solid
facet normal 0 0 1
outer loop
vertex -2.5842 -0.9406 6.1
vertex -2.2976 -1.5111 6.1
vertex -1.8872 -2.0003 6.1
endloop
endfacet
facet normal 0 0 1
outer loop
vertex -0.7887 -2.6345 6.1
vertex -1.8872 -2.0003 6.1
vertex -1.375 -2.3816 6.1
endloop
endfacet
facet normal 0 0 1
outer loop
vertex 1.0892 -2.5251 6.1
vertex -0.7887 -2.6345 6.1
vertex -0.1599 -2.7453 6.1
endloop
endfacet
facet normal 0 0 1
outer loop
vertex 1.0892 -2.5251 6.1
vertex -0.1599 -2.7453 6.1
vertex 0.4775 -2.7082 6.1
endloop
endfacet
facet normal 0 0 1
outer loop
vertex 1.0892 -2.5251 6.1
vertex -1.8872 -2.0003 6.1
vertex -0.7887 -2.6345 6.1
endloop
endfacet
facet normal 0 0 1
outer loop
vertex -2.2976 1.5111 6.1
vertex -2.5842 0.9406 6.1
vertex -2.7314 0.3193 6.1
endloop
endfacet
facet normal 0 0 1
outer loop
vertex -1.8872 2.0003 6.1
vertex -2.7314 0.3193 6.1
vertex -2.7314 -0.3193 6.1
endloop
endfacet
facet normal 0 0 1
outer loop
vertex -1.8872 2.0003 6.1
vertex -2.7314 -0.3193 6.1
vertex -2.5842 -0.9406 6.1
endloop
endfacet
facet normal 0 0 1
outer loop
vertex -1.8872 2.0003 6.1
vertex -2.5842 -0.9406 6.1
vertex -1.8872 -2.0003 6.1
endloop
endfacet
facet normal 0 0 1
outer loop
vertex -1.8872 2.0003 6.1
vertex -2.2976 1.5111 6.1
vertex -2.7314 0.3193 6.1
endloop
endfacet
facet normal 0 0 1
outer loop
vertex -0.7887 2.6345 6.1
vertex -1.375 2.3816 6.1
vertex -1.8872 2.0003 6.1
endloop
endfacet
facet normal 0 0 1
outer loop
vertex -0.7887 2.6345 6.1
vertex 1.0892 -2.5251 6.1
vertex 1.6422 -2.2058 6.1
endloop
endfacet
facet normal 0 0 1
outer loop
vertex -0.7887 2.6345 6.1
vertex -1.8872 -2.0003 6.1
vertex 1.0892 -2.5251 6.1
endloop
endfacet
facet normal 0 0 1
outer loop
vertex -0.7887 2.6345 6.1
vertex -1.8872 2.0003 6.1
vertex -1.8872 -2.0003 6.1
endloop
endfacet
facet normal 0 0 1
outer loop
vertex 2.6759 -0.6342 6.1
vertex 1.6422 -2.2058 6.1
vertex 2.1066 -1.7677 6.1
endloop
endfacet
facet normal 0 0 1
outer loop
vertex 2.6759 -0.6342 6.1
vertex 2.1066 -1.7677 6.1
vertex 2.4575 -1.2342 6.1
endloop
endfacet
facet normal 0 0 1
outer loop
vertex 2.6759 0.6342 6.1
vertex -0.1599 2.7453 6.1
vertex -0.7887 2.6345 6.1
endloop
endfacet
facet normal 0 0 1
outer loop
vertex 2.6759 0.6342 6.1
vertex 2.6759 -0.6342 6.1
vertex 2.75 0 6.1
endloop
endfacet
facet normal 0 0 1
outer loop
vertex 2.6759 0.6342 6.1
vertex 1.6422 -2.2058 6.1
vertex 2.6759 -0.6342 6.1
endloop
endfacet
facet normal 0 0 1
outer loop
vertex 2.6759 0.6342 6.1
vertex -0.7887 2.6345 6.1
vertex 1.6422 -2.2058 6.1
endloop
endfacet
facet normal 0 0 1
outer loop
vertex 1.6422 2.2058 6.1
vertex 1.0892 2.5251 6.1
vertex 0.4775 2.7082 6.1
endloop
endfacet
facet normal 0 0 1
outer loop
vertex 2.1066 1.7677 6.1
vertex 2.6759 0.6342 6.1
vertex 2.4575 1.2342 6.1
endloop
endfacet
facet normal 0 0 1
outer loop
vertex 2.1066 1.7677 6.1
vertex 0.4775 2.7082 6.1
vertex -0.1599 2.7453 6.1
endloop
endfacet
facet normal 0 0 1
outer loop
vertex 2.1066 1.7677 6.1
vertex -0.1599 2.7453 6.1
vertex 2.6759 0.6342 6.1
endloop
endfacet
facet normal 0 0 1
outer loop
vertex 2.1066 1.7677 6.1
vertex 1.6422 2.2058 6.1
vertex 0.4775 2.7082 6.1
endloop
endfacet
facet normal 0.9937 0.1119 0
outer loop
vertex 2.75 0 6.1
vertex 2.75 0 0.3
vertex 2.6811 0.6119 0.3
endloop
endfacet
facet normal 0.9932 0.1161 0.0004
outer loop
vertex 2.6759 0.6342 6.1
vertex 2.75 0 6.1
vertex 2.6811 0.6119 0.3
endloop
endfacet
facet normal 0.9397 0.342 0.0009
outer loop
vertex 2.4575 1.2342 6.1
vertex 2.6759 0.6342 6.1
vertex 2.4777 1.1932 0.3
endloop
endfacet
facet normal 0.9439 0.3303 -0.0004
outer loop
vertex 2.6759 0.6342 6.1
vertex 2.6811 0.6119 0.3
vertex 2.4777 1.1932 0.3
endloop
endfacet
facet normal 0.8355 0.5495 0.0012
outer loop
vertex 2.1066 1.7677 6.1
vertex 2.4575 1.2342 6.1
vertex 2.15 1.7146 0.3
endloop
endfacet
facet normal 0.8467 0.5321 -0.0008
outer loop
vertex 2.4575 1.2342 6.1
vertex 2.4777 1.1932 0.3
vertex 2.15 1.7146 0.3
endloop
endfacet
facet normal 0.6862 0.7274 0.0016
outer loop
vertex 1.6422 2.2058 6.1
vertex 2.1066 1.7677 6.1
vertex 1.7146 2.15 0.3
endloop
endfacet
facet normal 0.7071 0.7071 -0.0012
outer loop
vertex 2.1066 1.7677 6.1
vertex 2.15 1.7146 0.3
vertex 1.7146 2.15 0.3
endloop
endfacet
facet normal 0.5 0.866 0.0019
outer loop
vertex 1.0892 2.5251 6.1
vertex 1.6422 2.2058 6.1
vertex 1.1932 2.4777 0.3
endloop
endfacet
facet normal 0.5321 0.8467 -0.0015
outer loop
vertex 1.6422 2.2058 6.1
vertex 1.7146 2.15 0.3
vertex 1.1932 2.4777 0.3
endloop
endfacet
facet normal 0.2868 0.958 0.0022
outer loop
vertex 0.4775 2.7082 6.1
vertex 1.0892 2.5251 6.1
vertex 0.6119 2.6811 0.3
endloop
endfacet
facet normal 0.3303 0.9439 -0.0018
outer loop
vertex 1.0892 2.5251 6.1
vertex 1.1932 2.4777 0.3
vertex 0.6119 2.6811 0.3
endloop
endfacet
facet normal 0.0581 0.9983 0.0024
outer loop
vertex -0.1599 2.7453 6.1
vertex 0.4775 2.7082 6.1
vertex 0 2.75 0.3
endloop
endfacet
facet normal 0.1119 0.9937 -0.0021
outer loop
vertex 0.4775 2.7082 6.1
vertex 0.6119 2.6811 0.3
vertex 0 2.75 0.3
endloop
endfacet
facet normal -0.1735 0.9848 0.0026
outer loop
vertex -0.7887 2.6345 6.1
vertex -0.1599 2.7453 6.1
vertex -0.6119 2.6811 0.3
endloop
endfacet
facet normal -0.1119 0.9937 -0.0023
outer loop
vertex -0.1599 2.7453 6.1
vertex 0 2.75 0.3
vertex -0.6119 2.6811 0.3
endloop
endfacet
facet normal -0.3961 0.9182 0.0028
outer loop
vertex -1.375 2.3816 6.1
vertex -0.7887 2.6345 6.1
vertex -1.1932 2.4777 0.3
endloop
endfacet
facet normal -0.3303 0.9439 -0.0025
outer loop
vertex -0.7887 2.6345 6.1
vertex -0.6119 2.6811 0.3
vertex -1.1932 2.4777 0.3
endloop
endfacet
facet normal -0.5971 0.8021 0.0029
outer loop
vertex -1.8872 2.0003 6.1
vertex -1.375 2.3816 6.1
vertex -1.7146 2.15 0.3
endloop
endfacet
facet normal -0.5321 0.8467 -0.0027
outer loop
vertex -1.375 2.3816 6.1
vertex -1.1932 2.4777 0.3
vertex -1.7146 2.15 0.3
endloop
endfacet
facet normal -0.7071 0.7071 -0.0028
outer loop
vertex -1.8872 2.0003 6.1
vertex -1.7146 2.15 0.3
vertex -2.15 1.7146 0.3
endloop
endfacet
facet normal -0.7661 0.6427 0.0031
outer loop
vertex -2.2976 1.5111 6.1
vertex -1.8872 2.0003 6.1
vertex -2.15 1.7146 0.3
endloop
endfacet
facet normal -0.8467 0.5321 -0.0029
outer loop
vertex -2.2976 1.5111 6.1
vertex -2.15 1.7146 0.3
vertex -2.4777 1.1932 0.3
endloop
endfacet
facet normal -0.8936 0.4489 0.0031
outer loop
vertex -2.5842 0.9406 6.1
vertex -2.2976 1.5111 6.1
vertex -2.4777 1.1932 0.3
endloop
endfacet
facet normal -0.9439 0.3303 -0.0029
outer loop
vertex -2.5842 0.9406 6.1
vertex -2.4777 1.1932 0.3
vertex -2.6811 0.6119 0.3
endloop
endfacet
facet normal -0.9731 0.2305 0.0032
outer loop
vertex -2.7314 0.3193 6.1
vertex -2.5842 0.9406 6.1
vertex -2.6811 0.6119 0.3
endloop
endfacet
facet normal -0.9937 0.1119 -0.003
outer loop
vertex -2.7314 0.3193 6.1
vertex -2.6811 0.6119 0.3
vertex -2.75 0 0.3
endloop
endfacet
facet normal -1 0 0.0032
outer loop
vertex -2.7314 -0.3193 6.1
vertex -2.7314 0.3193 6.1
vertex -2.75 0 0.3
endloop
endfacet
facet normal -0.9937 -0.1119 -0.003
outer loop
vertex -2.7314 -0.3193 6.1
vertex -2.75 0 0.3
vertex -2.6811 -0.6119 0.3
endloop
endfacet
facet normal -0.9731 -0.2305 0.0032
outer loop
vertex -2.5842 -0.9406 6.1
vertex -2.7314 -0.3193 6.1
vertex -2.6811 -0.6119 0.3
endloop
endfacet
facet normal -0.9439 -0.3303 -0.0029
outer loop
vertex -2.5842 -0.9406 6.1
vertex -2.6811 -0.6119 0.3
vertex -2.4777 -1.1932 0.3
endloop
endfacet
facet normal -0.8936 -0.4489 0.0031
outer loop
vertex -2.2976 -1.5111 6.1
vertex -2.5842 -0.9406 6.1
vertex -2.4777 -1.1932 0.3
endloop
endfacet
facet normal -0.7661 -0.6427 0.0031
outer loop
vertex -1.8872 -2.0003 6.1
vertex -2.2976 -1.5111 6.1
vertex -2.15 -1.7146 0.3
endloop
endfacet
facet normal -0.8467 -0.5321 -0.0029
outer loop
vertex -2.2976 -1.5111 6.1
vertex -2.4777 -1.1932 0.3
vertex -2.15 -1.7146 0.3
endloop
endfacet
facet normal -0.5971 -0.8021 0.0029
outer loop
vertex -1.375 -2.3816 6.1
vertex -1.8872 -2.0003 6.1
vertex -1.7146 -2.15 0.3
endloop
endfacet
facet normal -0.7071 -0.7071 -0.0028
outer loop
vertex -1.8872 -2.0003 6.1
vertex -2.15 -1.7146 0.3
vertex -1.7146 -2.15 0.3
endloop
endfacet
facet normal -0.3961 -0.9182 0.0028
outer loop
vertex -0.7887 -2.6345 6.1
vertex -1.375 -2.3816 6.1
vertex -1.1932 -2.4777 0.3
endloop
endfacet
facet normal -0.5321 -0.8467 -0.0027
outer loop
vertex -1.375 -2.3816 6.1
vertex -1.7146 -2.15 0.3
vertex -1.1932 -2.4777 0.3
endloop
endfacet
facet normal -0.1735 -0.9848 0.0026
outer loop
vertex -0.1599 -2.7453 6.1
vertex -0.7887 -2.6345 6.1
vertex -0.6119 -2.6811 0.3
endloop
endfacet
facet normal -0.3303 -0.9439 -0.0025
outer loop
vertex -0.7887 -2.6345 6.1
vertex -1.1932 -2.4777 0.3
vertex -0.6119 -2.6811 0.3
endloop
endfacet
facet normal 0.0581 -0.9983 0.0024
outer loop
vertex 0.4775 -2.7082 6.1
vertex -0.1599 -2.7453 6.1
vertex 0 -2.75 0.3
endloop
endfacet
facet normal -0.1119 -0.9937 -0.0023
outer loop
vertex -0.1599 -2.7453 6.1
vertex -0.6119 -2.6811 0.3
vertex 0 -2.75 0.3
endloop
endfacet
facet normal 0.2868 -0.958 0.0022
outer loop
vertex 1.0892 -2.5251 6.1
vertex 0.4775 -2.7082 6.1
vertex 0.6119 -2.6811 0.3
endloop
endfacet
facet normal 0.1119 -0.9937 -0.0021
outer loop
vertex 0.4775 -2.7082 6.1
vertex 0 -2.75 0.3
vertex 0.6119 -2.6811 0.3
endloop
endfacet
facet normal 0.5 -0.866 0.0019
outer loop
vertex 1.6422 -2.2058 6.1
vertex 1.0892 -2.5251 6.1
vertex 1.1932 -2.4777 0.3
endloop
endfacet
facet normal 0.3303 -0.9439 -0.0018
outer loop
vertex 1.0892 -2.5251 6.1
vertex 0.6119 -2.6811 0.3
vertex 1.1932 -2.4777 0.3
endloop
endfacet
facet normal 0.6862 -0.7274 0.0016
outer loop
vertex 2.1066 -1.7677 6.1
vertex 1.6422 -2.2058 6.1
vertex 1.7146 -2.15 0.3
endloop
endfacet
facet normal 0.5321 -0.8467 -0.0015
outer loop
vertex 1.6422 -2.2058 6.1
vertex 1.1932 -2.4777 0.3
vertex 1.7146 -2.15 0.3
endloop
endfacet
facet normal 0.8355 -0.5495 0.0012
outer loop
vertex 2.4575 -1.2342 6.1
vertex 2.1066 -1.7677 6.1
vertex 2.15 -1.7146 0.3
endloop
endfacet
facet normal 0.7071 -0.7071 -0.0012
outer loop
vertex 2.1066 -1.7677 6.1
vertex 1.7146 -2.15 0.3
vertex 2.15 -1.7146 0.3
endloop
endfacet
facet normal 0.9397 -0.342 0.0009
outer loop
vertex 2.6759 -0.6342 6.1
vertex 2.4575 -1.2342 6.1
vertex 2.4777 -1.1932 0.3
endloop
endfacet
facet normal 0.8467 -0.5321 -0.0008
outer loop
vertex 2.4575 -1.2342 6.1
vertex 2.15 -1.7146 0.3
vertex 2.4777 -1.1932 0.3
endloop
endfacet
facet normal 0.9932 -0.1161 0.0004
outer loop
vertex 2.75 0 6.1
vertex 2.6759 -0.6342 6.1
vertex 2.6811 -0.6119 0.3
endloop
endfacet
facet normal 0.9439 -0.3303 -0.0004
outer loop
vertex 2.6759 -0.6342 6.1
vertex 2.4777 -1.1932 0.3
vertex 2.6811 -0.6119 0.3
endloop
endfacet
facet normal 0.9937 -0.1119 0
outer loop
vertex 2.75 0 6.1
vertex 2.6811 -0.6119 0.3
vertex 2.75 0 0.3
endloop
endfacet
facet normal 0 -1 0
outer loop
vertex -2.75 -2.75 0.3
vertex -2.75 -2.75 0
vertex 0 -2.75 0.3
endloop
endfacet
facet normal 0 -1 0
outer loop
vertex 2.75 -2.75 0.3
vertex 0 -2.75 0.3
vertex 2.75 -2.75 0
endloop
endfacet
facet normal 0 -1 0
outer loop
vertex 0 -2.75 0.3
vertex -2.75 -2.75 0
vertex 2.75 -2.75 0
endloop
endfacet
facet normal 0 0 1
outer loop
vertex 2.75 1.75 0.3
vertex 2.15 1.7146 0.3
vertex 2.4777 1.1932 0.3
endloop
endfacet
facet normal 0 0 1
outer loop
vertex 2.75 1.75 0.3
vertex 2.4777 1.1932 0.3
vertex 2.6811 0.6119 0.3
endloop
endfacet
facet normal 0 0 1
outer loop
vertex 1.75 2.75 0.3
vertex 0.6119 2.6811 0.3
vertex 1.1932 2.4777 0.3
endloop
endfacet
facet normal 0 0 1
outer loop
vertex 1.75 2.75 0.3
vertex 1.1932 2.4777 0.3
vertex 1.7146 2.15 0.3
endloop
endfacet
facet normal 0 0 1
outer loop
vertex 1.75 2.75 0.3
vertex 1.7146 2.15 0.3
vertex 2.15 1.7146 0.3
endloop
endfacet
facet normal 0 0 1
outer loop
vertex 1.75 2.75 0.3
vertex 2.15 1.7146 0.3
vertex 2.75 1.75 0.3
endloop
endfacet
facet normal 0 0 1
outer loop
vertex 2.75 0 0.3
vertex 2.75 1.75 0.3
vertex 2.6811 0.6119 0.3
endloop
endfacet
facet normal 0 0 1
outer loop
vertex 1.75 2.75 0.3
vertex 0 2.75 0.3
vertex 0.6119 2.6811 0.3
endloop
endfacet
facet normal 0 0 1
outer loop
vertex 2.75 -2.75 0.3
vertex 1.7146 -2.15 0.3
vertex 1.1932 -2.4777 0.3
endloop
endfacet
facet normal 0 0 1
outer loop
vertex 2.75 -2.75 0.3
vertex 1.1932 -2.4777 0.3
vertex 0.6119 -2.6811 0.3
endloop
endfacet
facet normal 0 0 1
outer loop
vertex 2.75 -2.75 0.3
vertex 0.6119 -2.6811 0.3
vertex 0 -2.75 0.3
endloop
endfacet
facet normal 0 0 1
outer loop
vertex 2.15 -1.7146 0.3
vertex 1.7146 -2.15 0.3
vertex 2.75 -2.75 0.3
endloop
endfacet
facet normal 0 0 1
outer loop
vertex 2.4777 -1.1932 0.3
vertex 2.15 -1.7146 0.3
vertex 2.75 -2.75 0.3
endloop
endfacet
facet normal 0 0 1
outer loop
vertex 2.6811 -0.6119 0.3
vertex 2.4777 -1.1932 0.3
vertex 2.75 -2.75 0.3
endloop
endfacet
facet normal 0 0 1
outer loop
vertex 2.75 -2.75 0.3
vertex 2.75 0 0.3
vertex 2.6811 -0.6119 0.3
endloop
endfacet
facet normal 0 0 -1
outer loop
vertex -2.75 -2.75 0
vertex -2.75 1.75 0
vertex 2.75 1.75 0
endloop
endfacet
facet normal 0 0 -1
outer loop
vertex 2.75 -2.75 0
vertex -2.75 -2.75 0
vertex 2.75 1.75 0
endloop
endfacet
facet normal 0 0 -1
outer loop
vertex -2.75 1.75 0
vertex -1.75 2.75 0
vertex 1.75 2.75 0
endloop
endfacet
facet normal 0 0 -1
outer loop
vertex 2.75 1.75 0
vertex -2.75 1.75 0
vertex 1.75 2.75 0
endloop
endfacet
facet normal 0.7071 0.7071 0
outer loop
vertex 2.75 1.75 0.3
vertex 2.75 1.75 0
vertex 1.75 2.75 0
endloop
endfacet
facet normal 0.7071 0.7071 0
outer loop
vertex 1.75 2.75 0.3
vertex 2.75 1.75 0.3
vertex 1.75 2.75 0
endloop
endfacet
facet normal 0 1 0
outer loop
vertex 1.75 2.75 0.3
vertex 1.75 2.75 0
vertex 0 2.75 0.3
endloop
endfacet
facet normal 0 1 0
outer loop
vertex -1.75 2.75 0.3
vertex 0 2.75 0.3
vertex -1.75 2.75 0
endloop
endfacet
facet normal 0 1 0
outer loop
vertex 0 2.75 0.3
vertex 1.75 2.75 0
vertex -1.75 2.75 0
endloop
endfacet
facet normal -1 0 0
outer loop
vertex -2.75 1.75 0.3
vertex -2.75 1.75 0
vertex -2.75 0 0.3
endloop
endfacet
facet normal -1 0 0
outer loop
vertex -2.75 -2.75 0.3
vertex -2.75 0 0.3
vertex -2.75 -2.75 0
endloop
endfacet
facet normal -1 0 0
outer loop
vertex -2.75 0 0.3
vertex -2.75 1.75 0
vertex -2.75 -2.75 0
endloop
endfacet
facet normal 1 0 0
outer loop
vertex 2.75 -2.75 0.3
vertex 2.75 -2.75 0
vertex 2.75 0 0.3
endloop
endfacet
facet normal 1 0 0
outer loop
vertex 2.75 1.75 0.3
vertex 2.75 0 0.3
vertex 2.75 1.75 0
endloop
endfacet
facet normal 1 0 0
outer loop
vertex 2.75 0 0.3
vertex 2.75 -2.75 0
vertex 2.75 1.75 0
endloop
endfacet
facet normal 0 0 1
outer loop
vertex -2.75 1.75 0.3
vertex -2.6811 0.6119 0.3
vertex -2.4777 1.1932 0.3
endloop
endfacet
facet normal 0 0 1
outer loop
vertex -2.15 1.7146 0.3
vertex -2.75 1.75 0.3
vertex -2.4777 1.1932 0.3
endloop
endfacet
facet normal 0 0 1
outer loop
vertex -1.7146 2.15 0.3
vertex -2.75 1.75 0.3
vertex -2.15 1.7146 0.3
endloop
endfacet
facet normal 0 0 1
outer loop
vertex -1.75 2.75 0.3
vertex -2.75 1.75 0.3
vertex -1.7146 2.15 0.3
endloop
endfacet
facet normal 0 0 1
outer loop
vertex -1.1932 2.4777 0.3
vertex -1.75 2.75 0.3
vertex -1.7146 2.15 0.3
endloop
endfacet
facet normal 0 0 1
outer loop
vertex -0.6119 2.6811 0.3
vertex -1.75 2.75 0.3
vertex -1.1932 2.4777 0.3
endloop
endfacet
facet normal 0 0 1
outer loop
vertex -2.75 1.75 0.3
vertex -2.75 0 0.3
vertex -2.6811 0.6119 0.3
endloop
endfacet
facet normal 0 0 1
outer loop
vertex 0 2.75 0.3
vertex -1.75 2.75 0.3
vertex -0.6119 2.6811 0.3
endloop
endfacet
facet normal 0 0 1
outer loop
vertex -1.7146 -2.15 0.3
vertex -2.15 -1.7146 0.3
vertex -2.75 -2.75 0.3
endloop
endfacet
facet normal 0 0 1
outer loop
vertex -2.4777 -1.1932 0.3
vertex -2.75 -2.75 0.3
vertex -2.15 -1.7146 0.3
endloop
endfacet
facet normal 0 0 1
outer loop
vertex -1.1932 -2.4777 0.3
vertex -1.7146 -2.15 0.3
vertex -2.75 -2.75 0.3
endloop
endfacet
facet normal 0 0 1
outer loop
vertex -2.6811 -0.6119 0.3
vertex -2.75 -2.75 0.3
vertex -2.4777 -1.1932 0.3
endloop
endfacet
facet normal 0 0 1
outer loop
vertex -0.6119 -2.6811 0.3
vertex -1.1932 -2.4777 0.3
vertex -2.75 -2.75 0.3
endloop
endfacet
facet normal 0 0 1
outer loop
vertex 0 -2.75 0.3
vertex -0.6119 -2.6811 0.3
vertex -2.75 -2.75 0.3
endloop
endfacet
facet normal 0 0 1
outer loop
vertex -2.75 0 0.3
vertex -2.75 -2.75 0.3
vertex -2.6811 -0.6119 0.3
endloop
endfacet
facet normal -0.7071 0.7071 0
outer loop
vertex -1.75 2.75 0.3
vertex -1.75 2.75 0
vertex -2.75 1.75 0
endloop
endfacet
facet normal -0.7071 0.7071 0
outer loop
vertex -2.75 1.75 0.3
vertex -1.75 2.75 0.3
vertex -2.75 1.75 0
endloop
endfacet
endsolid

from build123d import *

# Parameters (mm, degrees)
F1_DEPTH = 0.3
F2_R     = 2.75
F3_DEPTH = 6.1


with BuildPart() as f1:
    # F0 (on Top) → F1 (new body)
    with BuildSketch(Plane.XY):
        Polygon((-2.75, -2.75), (2.75, -2.75), (2.75, 1.75), (1.75, 2.75), (-1.75, 2.75), (-2.75, 1.75), align=None)
    extrude(amount=F1_DEPTH)

    # F2 (on Top) → F3 (join)
    with BuildSketch(Plane.XY):
        Circle(F2_R)
    extrude(amount=F3_DEPTH)


solid = f1.part
